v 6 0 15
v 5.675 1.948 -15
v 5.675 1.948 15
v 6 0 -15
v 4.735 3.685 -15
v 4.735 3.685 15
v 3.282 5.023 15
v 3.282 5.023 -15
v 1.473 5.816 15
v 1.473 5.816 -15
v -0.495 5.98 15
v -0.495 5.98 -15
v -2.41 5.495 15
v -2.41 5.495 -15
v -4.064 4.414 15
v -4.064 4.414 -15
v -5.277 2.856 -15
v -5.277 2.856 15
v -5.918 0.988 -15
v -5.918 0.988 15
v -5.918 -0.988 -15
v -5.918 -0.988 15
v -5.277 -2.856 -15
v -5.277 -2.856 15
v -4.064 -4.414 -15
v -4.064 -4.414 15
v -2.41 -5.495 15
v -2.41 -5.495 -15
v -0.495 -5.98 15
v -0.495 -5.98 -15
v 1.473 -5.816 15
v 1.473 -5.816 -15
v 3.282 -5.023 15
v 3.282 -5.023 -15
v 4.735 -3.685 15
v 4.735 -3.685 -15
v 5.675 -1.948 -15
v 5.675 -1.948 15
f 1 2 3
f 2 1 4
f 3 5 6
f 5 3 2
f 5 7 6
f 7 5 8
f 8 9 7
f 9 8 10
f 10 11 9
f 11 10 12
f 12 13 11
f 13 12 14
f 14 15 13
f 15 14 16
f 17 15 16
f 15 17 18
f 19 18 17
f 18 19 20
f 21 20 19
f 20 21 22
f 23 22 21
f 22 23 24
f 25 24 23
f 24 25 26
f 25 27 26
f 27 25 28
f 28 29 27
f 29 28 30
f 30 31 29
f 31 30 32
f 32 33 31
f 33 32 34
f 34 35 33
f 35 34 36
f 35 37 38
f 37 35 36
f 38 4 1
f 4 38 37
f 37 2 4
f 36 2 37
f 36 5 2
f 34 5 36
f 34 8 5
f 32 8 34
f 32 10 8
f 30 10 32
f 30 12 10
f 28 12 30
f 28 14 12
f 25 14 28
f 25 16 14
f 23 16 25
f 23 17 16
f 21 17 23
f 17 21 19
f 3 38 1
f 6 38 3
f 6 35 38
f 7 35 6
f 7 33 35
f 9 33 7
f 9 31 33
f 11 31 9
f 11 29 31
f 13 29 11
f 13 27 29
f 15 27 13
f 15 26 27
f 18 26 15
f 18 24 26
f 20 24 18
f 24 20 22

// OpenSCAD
difference() {
  *sphere(r=10);
  cylinder(h=30, r=6, center=true);
}
*if (true) cube([25,6,3], center=true);
